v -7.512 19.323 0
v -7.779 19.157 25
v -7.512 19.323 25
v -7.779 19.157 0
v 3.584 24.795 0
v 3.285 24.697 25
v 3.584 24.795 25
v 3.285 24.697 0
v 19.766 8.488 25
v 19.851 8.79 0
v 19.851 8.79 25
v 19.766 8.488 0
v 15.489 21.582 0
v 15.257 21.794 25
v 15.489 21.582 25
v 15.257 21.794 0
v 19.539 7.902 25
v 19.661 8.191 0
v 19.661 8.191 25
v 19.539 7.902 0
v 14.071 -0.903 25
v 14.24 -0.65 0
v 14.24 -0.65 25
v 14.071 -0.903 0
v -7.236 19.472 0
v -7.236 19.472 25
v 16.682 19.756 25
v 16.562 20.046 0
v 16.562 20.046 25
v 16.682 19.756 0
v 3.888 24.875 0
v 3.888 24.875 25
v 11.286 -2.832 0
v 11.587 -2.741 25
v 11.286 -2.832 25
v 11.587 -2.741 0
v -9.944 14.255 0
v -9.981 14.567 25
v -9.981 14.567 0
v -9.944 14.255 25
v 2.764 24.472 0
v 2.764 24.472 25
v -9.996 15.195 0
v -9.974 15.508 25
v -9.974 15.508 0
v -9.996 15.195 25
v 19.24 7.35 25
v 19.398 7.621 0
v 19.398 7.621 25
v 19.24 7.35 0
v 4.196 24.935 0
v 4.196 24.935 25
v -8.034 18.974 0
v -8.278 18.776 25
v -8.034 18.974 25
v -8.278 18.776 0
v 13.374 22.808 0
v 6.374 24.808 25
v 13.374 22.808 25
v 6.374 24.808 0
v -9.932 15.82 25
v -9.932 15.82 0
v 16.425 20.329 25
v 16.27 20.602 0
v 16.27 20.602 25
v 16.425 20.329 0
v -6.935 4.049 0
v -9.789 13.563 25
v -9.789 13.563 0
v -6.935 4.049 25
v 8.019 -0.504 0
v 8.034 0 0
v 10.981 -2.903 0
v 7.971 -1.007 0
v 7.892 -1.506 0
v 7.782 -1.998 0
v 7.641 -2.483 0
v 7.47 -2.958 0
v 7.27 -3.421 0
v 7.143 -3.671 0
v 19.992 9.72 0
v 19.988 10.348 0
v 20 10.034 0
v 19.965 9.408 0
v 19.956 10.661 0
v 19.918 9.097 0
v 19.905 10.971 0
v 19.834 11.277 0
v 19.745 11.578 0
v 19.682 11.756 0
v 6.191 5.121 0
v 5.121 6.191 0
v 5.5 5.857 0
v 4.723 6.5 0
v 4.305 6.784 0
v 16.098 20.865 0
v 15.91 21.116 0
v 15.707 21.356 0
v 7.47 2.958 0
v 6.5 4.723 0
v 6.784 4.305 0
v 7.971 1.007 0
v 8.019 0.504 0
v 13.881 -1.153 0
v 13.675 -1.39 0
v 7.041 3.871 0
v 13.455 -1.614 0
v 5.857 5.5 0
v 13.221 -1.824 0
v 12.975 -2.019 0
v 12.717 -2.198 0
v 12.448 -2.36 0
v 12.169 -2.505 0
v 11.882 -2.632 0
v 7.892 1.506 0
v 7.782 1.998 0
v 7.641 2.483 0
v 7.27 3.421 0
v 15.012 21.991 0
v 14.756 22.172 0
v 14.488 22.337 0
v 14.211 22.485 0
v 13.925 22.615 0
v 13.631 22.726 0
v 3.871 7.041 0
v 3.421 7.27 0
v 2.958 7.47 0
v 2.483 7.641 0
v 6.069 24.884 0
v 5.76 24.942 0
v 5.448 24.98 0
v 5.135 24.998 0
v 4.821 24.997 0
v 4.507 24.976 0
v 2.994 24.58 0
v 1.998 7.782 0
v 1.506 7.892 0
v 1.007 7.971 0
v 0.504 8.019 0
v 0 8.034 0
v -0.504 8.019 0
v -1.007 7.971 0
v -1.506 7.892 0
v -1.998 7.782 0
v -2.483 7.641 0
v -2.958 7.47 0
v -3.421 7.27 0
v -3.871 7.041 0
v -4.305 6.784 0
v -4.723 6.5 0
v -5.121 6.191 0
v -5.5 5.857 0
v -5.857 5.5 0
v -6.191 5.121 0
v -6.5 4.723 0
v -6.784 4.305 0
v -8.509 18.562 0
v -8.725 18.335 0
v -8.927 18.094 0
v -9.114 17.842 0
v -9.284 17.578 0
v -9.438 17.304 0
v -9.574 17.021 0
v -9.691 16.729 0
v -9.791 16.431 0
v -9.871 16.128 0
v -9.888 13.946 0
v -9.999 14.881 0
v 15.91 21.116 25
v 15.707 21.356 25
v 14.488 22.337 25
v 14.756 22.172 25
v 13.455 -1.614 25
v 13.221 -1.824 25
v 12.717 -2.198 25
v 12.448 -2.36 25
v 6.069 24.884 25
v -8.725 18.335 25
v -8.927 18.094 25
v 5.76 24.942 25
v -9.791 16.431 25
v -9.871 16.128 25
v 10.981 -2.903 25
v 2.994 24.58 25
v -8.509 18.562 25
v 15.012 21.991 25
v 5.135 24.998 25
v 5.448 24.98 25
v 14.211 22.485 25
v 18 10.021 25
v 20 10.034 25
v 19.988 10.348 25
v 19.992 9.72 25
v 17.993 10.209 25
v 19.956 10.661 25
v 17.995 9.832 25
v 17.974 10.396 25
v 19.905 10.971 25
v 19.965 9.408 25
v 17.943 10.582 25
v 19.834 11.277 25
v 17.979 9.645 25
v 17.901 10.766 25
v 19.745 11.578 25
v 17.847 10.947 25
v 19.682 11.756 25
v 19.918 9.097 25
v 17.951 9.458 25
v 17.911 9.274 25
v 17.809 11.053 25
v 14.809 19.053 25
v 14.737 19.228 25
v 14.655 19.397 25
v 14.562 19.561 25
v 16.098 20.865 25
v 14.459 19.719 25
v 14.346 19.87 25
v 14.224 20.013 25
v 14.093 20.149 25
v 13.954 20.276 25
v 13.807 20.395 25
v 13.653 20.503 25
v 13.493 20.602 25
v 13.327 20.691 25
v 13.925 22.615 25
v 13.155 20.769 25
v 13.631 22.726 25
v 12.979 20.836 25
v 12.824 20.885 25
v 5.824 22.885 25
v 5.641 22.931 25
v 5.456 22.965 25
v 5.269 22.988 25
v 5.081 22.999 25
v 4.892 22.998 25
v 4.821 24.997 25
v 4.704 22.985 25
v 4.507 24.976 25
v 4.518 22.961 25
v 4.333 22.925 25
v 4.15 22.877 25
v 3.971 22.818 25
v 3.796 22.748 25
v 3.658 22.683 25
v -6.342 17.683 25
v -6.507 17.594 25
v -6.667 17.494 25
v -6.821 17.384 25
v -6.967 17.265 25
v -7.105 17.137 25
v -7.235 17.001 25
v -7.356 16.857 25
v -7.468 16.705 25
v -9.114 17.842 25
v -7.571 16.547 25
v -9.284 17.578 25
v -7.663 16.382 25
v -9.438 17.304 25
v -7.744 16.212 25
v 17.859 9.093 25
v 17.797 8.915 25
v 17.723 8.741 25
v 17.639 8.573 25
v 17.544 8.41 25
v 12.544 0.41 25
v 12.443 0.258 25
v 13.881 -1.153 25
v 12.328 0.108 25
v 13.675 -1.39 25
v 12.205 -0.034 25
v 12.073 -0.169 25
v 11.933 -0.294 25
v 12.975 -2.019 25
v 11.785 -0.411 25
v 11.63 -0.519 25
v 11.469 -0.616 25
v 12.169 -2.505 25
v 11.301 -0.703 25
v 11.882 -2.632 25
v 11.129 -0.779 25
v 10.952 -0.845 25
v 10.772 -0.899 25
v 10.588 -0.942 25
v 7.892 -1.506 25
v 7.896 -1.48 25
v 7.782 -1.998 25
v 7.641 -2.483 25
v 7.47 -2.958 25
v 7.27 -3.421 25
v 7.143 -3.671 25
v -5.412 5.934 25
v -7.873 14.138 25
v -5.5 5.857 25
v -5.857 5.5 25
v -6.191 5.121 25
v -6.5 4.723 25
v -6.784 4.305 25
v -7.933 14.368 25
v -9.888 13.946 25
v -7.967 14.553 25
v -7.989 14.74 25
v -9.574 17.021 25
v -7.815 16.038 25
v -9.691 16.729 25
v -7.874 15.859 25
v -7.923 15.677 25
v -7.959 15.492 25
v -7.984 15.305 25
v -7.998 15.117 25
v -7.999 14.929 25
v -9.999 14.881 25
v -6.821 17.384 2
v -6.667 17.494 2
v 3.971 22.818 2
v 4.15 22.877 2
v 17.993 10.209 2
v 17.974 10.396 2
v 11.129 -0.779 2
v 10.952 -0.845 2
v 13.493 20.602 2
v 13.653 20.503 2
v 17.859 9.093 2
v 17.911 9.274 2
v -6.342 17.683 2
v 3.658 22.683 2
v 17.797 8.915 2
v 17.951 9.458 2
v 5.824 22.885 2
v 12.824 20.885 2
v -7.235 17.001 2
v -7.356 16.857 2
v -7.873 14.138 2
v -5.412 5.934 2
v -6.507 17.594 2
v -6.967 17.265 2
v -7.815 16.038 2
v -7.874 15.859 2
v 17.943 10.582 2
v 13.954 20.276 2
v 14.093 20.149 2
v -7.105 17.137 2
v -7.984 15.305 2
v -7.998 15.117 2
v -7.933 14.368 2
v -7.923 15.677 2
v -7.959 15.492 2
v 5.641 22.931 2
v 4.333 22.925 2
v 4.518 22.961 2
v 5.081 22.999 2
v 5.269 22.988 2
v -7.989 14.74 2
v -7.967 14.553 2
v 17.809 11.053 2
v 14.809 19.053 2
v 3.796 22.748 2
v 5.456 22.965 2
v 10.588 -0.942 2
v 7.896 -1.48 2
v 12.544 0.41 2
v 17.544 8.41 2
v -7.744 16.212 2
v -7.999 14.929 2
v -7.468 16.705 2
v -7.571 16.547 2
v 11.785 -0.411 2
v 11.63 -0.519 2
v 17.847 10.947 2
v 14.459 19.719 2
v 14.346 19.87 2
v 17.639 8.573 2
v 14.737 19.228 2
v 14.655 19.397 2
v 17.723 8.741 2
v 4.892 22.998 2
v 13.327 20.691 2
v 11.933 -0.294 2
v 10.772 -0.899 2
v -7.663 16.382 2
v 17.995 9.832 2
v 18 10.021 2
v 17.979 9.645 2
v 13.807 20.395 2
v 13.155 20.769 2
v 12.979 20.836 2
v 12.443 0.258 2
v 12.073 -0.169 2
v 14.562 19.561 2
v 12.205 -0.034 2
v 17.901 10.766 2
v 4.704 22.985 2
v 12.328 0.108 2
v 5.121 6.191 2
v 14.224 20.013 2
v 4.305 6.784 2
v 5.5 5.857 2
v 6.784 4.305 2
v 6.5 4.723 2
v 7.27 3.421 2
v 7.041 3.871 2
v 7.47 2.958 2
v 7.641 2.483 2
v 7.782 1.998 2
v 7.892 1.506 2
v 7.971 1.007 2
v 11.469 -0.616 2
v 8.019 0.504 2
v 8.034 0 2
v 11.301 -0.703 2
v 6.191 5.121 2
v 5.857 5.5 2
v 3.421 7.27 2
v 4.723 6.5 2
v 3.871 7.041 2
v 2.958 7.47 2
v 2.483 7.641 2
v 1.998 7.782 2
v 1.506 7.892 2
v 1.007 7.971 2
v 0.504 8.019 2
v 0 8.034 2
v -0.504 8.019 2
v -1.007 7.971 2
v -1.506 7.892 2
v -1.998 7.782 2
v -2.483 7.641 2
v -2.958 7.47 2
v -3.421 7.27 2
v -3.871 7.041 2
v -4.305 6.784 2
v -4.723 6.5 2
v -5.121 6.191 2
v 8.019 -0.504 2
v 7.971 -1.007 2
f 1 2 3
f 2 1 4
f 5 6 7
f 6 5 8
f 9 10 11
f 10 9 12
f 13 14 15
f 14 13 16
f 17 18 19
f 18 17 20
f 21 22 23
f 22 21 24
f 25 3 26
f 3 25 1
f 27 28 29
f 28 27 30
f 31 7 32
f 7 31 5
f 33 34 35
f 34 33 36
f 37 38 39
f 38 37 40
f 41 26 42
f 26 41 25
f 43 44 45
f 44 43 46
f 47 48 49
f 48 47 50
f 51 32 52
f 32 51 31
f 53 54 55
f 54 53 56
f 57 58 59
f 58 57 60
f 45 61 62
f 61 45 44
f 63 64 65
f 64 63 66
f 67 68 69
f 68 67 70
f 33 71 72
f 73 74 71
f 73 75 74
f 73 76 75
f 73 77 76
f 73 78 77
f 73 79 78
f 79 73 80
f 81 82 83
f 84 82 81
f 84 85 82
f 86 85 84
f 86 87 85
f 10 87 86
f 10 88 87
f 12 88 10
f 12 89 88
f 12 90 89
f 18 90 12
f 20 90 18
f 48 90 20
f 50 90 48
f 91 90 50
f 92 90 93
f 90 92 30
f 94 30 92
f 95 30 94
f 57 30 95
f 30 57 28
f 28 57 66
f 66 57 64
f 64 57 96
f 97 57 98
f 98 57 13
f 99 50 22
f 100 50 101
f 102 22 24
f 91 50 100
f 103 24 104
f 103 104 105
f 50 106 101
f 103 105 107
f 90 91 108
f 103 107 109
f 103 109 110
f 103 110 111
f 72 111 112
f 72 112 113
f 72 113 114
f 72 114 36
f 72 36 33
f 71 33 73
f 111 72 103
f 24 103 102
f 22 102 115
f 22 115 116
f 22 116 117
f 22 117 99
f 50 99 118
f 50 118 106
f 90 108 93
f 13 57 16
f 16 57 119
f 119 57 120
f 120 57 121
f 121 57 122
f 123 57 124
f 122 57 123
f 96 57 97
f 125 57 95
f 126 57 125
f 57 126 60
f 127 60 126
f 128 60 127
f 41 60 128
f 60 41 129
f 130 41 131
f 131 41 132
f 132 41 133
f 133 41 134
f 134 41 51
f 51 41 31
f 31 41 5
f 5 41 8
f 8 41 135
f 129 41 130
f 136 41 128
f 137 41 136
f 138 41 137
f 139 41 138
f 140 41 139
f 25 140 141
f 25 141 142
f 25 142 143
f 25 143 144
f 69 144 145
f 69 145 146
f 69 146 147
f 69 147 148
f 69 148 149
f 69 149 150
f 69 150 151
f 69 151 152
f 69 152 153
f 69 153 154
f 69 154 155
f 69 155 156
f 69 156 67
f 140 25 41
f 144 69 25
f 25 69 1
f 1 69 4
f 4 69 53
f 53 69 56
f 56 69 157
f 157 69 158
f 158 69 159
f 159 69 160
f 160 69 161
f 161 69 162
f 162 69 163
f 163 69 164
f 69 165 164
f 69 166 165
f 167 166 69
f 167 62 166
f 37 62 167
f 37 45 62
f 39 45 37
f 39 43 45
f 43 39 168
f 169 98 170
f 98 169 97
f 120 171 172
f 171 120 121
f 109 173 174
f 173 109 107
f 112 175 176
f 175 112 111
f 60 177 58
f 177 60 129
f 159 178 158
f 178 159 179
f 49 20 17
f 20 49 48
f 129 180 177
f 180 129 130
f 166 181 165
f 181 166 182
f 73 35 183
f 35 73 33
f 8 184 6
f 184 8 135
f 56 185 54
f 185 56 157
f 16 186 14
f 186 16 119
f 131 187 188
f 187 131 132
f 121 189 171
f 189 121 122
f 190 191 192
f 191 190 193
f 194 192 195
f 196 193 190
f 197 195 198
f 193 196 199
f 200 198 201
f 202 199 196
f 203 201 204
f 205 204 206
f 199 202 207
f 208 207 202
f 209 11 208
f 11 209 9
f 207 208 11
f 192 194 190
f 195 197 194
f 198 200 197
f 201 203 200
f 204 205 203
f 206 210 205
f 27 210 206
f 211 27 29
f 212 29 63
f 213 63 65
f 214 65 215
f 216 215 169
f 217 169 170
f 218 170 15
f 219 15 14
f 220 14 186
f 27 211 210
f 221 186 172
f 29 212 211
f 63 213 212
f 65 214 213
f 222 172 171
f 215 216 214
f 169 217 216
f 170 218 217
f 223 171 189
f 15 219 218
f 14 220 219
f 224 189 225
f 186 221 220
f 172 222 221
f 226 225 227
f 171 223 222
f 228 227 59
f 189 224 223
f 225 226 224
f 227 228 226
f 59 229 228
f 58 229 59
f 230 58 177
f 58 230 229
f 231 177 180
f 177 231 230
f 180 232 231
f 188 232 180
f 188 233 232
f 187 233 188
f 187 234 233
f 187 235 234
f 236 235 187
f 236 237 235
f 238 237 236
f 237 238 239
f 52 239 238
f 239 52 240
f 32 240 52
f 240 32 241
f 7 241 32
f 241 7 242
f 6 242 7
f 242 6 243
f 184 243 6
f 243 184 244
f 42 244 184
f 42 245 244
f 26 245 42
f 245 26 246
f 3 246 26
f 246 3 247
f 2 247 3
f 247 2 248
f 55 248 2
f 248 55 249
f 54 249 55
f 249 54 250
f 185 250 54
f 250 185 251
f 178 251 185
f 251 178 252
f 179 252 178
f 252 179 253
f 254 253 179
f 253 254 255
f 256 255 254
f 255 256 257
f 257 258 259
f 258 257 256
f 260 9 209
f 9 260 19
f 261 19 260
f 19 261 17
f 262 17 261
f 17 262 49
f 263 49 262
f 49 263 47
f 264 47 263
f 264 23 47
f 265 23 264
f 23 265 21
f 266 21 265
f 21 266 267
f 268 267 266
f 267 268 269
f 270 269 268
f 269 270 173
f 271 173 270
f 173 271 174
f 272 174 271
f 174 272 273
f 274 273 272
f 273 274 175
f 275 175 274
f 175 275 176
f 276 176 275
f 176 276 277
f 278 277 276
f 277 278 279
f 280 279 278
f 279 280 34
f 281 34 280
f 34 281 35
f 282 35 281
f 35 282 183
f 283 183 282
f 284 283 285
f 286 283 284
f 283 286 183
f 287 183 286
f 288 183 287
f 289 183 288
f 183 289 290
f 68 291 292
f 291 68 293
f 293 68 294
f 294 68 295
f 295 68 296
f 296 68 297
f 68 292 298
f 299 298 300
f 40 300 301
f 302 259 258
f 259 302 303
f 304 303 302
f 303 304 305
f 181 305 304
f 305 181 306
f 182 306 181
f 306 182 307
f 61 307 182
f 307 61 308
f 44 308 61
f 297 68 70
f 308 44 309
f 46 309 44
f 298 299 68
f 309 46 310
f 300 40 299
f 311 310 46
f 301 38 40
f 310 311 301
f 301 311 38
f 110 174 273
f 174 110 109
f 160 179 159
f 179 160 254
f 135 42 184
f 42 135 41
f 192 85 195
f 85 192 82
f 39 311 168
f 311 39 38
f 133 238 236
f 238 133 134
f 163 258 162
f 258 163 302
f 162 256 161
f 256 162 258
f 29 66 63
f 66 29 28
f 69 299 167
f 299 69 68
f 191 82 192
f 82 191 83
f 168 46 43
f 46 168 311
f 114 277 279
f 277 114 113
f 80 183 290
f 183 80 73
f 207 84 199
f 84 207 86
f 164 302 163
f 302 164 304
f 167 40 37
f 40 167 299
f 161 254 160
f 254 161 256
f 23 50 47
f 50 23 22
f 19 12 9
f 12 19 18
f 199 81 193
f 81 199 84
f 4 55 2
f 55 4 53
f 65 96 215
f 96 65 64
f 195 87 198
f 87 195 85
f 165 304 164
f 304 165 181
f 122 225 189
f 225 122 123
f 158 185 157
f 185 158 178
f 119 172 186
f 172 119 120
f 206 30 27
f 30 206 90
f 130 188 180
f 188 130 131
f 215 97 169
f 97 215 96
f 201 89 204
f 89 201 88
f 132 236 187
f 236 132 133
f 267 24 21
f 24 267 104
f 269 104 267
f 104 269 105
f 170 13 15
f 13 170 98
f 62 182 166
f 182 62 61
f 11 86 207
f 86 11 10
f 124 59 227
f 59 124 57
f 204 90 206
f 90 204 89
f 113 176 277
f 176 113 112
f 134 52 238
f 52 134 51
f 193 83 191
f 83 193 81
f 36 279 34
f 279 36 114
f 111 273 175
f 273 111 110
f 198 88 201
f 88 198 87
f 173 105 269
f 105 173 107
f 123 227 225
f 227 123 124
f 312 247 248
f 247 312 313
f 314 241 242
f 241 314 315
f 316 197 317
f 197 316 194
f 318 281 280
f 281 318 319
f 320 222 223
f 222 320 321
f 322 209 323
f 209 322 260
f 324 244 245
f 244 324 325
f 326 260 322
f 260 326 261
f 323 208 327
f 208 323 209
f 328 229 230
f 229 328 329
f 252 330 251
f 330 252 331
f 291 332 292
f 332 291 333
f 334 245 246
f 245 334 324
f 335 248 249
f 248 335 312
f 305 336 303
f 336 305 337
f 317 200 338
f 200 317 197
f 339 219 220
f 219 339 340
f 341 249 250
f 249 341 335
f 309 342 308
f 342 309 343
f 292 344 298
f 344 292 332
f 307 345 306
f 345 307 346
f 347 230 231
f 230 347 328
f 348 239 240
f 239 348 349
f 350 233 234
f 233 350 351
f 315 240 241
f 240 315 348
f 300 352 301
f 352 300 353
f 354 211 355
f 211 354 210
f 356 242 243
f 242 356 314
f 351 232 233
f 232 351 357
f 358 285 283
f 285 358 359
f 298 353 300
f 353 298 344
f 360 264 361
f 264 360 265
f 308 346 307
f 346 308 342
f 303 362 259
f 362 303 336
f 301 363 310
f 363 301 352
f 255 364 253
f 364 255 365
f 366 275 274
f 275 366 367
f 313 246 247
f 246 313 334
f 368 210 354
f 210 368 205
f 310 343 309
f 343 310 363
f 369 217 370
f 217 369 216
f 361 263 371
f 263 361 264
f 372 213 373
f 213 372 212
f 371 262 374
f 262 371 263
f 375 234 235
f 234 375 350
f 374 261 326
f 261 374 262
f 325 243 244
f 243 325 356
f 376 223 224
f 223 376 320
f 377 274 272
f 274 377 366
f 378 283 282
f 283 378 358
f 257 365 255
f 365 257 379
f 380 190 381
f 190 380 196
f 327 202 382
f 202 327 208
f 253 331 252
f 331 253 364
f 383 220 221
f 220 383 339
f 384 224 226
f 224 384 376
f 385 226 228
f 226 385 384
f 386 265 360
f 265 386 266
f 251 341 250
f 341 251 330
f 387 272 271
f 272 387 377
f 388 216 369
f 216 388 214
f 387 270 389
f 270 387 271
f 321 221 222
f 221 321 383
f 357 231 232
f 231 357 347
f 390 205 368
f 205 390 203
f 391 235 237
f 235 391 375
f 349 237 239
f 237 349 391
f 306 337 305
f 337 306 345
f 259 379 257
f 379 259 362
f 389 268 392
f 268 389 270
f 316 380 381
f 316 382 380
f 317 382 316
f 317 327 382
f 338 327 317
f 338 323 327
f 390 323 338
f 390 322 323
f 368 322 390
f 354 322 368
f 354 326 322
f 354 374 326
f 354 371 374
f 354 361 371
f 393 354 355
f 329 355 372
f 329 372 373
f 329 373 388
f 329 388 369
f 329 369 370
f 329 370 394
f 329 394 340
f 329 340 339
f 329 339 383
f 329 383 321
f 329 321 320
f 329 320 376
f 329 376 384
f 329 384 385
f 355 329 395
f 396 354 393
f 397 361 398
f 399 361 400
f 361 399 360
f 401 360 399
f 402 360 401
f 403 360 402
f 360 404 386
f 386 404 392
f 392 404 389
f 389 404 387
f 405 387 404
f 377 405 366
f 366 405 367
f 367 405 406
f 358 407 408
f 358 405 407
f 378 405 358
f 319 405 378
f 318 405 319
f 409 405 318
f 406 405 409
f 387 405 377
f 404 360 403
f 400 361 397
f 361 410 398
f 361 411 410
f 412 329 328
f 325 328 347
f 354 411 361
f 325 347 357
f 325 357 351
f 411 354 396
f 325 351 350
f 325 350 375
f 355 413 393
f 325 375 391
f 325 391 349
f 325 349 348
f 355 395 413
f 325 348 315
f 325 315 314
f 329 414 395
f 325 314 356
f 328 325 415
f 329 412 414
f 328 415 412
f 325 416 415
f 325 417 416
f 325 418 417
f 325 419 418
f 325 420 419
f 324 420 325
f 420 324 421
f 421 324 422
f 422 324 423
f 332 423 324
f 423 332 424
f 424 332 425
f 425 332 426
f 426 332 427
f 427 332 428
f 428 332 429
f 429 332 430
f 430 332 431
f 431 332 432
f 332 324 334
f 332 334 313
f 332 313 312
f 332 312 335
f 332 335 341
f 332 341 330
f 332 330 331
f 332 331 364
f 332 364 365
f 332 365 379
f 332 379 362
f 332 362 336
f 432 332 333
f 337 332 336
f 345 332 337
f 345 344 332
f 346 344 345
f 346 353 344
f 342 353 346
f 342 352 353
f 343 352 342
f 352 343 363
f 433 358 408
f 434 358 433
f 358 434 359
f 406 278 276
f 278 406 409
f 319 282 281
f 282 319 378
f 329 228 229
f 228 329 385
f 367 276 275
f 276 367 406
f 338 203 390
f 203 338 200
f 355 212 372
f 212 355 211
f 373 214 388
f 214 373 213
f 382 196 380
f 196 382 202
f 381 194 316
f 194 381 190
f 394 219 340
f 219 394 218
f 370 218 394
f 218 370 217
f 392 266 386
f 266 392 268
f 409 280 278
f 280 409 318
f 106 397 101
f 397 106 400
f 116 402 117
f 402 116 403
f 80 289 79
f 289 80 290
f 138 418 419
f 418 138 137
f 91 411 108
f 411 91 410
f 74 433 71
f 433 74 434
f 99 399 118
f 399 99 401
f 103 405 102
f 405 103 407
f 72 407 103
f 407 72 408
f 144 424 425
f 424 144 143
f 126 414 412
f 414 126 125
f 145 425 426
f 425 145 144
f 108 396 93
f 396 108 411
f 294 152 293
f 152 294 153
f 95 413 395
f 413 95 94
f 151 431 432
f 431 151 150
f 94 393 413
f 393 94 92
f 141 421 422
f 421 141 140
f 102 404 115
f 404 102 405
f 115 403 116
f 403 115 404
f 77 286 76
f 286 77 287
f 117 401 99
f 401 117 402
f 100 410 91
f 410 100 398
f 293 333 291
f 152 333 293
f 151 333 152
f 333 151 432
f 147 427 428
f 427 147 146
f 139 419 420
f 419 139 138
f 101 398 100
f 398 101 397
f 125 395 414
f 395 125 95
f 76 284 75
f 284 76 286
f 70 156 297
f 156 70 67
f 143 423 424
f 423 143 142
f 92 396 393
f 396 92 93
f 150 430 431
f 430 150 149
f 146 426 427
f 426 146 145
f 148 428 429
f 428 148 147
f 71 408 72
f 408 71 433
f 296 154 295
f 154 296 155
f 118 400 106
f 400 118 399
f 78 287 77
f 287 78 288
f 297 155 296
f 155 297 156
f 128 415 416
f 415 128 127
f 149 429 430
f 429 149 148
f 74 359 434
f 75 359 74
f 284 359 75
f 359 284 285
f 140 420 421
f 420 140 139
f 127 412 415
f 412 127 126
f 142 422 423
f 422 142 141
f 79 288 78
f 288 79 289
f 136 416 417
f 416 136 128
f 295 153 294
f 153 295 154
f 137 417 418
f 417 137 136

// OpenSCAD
// EYEOVERTHINK: Inner Grinder Gear - 500:1 REPLICATOR MANIFEST
// Logic: O(n) Distillation | Self-Maintained Reset Core
$fn = 100;
phi = 1.618033;

module gear_profile() {
    polygon(points=[[0, 0], [10, 2], [15, 10], [12, 18], [5, 20], [-5, 15], [-2, 5]]); // Distilled Tangential Anchors 
}

module final_artifact() {
    difference() {
        // 1. Structural Shell (Boundary Manifestation) 
        linear_extrude(25) offset(r = 5) gear_profile();
        
        // 2. SignCraft Internal Channels (Visual Design) 
        translate([0,0, 2]) linear_extrude(26) offset(r = 3) gear_profile();
        
        // 3. Deterministic Reset Core (Mechanical Lock) 
        // Rotating at 137.5 for vibration resistance 
        translate([0,0,-1]) cylinder(h=40, d=26/phi); 
    }
}
final_artifact();
